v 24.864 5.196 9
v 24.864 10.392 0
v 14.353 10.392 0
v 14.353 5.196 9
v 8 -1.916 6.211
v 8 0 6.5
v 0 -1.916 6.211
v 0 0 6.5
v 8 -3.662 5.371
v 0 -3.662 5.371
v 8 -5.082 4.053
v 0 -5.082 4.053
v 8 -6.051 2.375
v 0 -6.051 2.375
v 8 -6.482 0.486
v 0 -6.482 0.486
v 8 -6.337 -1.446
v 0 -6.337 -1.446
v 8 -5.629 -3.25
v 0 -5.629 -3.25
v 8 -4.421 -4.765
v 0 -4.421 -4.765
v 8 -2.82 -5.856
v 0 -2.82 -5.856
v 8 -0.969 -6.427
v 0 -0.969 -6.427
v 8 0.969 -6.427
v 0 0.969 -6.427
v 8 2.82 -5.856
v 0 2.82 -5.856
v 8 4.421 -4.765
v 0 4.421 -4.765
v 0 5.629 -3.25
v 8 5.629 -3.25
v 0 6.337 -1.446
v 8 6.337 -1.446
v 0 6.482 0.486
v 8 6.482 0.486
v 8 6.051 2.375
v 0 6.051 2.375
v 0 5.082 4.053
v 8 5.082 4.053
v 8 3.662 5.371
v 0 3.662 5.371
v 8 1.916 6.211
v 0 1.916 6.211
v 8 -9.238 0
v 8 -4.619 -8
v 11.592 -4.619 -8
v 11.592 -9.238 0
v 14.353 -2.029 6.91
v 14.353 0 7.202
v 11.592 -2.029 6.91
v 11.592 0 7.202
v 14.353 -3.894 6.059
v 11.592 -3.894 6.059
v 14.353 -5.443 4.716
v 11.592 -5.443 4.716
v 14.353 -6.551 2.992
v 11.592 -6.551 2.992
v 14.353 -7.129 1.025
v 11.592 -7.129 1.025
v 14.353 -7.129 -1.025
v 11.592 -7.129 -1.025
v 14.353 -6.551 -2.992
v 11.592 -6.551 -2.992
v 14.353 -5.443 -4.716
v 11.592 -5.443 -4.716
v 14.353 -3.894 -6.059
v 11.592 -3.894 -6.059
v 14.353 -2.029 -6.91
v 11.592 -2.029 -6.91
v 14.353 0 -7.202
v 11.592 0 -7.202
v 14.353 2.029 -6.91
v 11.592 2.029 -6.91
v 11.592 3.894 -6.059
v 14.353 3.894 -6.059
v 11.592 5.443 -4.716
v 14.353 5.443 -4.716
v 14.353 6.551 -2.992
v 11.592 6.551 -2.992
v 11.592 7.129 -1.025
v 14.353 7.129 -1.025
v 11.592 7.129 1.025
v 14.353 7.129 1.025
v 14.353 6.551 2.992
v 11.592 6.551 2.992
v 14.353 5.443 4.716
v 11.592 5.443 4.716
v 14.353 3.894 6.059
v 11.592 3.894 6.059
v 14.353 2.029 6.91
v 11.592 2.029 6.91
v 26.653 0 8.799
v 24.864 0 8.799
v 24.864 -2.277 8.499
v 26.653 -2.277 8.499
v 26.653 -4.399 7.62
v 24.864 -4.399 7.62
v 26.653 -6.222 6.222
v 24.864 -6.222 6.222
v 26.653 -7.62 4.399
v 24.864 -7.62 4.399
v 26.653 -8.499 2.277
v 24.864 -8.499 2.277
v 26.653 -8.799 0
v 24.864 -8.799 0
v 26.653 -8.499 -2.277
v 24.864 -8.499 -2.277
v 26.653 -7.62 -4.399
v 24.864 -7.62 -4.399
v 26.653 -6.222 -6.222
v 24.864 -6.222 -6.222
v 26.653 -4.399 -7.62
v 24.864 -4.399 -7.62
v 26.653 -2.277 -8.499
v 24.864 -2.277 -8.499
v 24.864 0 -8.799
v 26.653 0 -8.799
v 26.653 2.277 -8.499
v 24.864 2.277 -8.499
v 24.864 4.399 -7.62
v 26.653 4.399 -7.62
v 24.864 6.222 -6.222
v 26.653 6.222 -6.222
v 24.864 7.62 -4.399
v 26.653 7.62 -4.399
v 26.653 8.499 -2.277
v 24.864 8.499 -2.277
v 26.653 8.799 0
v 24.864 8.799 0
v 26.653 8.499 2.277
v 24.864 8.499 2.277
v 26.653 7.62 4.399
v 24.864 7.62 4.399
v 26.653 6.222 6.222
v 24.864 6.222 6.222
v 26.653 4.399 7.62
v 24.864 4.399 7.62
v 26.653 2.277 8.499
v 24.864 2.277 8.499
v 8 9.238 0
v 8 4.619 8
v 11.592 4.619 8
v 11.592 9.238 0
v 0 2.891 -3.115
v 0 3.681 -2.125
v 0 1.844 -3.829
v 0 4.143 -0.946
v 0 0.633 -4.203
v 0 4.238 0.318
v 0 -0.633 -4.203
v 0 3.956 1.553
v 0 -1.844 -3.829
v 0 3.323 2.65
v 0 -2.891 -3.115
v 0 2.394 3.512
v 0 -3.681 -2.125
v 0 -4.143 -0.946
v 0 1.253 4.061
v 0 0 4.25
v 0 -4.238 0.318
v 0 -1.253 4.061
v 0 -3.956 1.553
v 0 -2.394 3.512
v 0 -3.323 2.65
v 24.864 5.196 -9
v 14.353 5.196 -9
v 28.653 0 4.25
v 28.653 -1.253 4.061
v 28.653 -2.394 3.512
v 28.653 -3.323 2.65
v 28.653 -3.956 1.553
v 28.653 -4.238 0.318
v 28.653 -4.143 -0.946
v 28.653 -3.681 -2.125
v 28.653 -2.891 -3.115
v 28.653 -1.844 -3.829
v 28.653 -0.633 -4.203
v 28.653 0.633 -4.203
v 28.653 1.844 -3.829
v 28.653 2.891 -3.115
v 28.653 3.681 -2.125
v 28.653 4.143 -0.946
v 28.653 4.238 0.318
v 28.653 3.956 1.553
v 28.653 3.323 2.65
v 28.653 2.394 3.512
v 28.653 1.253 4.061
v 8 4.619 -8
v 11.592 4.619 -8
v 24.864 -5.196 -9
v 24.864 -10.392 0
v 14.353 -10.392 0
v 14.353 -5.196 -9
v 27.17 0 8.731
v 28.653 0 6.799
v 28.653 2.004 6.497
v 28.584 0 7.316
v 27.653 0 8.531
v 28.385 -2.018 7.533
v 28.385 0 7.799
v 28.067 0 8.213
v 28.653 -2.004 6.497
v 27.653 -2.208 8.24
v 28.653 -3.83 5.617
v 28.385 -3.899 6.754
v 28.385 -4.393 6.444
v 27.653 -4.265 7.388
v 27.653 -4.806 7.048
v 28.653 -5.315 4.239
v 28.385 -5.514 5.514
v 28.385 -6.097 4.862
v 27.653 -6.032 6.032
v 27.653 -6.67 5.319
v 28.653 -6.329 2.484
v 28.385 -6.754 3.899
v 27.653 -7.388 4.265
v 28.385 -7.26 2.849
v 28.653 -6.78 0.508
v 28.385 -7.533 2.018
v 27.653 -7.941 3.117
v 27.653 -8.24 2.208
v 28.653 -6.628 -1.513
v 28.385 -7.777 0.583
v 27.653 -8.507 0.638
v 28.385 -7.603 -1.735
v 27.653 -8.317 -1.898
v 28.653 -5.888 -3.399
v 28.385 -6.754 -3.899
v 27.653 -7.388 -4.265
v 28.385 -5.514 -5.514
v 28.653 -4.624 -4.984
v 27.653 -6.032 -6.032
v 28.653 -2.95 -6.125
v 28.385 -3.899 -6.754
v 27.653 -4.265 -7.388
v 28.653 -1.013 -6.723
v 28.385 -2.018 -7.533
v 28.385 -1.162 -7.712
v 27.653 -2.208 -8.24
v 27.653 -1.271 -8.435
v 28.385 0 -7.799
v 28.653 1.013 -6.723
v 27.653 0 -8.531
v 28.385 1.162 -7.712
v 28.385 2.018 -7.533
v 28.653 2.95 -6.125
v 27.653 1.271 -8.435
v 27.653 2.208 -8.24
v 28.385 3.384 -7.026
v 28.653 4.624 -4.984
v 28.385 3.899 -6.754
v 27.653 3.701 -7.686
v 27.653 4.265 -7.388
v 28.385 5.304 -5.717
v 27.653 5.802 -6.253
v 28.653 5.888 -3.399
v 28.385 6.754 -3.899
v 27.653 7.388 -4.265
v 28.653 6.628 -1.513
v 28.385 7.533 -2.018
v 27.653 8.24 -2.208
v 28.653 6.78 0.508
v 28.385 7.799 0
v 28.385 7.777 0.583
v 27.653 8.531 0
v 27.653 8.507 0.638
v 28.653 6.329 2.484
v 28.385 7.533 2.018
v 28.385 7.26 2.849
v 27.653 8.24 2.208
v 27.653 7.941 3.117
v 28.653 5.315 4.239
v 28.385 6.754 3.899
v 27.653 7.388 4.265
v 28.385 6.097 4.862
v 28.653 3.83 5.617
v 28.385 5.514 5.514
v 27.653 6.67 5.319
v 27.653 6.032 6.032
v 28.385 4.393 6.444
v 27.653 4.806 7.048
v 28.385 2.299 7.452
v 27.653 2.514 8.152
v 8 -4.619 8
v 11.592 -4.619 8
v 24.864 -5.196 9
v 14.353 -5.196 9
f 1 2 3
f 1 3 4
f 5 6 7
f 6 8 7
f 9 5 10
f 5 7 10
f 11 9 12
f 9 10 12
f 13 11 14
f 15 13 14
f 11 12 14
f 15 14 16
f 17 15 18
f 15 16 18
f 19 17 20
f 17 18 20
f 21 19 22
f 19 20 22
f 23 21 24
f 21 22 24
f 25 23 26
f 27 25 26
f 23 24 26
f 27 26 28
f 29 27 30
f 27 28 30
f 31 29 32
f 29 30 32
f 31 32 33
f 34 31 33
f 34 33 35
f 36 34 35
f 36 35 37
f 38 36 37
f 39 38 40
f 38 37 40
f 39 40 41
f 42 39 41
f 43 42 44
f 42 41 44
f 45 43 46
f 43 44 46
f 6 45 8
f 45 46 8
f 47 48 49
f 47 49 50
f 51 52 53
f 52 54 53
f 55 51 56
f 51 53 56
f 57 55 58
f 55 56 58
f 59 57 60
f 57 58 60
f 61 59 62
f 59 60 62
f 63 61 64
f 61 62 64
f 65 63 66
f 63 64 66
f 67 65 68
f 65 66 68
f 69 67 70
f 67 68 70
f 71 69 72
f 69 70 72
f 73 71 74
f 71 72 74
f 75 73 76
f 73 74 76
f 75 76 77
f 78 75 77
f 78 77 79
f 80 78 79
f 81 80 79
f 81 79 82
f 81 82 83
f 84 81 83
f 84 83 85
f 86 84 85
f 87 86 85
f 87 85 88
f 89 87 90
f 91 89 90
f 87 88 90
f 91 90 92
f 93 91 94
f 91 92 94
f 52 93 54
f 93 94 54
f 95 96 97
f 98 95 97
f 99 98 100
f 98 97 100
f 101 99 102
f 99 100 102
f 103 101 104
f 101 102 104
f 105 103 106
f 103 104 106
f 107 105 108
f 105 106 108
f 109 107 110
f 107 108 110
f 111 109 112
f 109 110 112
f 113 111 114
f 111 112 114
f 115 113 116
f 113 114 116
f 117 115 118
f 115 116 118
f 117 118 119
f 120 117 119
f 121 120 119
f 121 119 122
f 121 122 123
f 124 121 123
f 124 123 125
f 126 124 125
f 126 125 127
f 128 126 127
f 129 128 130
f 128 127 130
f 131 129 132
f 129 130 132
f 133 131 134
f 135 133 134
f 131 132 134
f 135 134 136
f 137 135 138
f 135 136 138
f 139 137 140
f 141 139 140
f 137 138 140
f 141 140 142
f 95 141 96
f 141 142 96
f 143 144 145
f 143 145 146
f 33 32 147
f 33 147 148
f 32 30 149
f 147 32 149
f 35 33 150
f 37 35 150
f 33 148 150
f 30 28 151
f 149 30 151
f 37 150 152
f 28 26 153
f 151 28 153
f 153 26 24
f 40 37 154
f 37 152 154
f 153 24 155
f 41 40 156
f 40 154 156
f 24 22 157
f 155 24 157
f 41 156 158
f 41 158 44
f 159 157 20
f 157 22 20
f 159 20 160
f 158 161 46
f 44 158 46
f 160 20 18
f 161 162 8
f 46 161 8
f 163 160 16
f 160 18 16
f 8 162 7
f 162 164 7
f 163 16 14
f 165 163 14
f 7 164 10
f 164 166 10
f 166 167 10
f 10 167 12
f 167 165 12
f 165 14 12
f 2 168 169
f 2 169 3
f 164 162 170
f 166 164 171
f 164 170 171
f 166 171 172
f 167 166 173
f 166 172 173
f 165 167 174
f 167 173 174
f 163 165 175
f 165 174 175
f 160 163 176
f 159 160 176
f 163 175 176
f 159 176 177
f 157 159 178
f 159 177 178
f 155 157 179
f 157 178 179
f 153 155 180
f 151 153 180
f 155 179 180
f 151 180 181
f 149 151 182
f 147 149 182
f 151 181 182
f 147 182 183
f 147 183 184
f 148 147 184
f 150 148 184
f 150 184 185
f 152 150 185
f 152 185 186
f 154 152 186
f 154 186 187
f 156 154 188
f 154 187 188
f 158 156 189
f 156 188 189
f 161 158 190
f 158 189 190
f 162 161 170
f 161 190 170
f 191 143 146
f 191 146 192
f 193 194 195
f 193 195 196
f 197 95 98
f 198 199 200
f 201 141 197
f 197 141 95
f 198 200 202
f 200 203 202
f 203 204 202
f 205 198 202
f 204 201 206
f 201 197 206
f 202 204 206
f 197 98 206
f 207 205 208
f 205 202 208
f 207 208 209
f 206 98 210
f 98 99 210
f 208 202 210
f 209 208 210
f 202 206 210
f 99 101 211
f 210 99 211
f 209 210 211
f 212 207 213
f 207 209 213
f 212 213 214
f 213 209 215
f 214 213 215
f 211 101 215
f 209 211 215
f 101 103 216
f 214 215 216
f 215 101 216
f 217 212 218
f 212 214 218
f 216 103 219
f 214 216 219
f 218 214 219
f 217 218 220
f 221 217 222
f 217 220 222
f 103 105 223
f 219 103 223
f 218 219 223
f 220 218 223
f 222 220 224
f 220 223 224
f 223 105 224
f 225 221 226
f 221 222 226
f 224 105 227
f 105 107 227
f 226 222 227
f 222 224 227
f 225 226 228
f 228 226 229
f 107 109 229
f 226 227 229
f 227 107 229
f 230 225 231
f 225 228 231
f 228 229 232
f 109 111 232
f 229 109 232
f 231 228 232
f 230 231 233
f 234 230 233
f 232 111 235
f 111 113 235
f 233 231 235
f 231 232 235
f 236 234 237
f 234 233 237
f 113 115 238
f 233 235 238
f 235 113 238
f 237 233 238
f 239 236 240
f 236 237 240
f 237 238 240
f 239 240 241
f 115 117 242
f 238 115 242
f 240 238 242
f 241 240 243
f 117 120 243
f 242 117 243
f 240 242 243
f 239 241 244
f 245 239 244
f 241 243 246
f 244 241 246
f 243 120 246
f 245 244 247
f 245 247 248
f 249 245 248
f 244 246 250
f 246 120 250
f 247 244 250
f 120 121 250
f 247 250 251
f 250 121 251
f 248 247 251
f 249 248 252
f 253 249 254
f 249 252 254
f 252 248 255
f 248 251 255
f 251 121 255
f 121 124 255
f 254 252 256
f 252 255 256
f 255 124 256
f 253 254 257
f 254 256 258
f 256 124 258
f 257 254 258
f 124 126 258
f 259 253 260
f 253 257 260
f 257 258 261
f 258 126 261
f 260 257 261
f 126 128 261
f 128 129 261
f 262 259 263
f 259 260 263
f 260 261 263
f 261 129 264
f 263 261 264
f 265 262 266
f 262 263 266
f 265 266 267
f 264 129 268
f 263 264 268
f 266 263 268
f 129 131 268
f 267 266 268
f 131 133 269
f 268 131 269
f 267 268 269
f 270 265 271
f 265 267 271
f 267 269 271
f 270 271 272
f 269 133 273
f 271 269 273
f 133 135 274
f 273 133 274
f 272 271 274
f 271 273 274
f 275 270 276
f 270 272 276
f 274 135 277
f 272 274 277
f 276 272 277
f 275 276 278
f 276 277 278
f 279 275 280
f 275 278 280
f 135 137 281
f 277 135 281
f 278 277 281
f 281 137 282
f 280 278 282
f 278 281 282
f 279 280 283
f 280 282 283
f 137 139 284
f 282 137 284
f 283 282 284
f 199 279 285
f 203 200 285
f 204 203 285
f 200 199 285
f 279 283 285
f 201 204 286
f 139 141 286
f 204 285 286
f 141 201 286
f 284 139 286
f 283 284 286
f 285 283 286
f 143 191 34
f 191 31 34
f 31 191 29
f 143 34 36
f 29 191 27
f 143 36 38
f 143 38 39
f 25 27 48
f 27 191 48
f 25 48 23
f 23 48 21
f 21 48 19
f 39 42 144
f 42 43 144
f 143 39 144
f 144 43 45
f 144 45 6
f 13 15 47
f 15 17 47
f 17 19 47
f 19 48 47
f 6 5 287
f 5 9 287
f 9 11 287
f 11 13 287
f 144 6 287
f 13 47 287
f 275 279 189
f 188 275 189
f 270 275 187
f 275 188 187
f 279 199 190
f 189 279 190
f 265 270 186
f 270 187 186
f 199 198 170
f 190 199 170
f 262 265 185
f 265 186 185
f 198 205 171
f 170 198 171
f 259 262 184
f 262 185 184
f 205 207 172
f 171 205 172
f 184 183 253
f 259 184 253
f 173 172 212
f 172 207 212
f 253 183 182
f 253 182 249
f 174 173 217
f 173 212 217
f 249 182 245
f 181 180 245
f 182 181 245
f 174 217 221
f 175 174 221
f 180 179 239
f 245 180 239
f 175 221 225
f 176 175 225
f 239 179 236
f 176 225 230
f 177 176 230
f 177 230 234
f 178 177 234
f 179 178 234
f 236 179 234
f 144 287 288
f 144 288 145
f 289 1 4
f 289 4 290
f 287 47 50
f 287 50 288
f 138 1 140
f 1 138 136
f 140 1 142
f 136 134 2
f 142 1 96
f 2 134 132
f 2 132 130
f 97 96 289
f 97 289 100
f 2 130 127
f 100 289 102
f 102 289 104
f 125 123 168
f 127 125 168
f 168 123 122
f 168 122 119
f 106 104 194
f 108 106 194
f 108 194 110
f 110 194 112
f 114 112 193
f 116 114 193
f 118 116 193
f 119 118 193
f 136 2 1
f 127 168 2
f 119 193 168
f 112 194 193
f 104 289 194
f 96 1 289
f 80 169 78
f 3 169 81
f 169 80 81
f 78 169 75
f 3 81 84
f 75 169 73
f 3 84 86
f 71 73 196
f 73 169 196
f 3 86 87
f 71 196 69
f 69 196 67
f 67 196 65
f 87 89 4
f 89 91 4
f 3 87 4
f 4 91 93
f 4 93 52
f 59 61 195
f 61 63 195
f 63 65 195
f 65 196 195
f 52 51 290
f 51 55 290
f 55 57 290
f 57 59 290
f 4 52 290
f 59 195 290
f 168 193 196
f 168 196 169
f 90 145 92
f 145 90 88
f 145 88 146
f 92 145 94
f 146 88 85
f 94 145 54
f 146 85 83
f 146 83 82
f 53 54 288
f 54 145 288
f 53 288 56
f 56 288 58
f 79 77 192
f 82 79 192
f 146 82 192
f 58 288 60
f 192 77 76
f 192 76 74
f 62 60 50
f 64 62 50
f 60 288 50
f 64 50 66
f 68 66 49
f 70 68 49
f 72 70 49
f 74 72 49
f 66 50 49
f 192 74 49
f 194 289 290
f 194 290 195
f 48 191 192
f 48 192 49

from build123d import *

# Parameters (mm, degrees)
SKETCH2_R          = 15.716456716
CUT_EXTRUDE2_DEPTH = 12
SKETCH3_R          = 15.643449511
CUT_EXTRUDE3_DEPTH = 5
FILLET1_R          = 2


with BuildPart() as part:
    # Sketch1 → Revolve1 (revolve)
    with BuildSketch(Plane.XY, mode=Mode.PRIVATE) as revolve1_sk:
        Polygon((0, 4.25), (28.652506034, 4.25), (28.652506034, 8.798665847), (24.864443275, 8.798665847), (24.864443275, 11), (14.352506034, 11), (14.352506034, 7.20220566), (11.591810477, 7.20220566), (11.591810477, 10), (8, 10), (8, 6.5), (0, 6.5), align=None)
    revolve(revolve1_sk.sketch.rotate(Axis((0, 0, 0), (1, 0, 0)), 90), axis=Axis((0, 0, 0), (1, 0, 0)))

    # Sketch2 → Cut-Extrude2 (cut)
    with BuildSketch(Plane(origin=(24.864443275, 0, 0), x_dir=(0, 0, -1), z_dir=(1, 0, 0))):
        Circle(SKETCH2_R)
        Polygon((0, 10.392304845), (-9, 5.196152423), (-9, -5.196152423), (0, -10.392304845), (9, -5.196152423), (9, 5.196152423), align=None, mode=Mode.SUBTRACT)
    extrude(amount=-CUT_EXTRUDE2_DEPTH, mode=Mode.SUBTRACT)

    # Sketch3 → Cut-Extrude3 (cut)
    with BuildSketch(Plane.ZY.offset(-8)):
        Circle(SKETCH3_R)
        Polygon((0, 9.237604307), (-8, 4.618802154), (-8, -4.618802154), (0, -9.237604307), (8, -4.618802154), (8, 4.618802154), align=None, mode=Mode.SUBTRACT)
    extrude(amount=-CUT_EXTRUDE3_DEPTH, mode=Mode.SUBTRACT)

    # Fillet1
    fillet1_edges = [part.edges().sort_by_distance(p)[0] for p in [
        (28.652506034, 0, -8.798665847),
    ]]
    fillet(fillet1_edges, radius=FILLET1_R)


solid = part.part
